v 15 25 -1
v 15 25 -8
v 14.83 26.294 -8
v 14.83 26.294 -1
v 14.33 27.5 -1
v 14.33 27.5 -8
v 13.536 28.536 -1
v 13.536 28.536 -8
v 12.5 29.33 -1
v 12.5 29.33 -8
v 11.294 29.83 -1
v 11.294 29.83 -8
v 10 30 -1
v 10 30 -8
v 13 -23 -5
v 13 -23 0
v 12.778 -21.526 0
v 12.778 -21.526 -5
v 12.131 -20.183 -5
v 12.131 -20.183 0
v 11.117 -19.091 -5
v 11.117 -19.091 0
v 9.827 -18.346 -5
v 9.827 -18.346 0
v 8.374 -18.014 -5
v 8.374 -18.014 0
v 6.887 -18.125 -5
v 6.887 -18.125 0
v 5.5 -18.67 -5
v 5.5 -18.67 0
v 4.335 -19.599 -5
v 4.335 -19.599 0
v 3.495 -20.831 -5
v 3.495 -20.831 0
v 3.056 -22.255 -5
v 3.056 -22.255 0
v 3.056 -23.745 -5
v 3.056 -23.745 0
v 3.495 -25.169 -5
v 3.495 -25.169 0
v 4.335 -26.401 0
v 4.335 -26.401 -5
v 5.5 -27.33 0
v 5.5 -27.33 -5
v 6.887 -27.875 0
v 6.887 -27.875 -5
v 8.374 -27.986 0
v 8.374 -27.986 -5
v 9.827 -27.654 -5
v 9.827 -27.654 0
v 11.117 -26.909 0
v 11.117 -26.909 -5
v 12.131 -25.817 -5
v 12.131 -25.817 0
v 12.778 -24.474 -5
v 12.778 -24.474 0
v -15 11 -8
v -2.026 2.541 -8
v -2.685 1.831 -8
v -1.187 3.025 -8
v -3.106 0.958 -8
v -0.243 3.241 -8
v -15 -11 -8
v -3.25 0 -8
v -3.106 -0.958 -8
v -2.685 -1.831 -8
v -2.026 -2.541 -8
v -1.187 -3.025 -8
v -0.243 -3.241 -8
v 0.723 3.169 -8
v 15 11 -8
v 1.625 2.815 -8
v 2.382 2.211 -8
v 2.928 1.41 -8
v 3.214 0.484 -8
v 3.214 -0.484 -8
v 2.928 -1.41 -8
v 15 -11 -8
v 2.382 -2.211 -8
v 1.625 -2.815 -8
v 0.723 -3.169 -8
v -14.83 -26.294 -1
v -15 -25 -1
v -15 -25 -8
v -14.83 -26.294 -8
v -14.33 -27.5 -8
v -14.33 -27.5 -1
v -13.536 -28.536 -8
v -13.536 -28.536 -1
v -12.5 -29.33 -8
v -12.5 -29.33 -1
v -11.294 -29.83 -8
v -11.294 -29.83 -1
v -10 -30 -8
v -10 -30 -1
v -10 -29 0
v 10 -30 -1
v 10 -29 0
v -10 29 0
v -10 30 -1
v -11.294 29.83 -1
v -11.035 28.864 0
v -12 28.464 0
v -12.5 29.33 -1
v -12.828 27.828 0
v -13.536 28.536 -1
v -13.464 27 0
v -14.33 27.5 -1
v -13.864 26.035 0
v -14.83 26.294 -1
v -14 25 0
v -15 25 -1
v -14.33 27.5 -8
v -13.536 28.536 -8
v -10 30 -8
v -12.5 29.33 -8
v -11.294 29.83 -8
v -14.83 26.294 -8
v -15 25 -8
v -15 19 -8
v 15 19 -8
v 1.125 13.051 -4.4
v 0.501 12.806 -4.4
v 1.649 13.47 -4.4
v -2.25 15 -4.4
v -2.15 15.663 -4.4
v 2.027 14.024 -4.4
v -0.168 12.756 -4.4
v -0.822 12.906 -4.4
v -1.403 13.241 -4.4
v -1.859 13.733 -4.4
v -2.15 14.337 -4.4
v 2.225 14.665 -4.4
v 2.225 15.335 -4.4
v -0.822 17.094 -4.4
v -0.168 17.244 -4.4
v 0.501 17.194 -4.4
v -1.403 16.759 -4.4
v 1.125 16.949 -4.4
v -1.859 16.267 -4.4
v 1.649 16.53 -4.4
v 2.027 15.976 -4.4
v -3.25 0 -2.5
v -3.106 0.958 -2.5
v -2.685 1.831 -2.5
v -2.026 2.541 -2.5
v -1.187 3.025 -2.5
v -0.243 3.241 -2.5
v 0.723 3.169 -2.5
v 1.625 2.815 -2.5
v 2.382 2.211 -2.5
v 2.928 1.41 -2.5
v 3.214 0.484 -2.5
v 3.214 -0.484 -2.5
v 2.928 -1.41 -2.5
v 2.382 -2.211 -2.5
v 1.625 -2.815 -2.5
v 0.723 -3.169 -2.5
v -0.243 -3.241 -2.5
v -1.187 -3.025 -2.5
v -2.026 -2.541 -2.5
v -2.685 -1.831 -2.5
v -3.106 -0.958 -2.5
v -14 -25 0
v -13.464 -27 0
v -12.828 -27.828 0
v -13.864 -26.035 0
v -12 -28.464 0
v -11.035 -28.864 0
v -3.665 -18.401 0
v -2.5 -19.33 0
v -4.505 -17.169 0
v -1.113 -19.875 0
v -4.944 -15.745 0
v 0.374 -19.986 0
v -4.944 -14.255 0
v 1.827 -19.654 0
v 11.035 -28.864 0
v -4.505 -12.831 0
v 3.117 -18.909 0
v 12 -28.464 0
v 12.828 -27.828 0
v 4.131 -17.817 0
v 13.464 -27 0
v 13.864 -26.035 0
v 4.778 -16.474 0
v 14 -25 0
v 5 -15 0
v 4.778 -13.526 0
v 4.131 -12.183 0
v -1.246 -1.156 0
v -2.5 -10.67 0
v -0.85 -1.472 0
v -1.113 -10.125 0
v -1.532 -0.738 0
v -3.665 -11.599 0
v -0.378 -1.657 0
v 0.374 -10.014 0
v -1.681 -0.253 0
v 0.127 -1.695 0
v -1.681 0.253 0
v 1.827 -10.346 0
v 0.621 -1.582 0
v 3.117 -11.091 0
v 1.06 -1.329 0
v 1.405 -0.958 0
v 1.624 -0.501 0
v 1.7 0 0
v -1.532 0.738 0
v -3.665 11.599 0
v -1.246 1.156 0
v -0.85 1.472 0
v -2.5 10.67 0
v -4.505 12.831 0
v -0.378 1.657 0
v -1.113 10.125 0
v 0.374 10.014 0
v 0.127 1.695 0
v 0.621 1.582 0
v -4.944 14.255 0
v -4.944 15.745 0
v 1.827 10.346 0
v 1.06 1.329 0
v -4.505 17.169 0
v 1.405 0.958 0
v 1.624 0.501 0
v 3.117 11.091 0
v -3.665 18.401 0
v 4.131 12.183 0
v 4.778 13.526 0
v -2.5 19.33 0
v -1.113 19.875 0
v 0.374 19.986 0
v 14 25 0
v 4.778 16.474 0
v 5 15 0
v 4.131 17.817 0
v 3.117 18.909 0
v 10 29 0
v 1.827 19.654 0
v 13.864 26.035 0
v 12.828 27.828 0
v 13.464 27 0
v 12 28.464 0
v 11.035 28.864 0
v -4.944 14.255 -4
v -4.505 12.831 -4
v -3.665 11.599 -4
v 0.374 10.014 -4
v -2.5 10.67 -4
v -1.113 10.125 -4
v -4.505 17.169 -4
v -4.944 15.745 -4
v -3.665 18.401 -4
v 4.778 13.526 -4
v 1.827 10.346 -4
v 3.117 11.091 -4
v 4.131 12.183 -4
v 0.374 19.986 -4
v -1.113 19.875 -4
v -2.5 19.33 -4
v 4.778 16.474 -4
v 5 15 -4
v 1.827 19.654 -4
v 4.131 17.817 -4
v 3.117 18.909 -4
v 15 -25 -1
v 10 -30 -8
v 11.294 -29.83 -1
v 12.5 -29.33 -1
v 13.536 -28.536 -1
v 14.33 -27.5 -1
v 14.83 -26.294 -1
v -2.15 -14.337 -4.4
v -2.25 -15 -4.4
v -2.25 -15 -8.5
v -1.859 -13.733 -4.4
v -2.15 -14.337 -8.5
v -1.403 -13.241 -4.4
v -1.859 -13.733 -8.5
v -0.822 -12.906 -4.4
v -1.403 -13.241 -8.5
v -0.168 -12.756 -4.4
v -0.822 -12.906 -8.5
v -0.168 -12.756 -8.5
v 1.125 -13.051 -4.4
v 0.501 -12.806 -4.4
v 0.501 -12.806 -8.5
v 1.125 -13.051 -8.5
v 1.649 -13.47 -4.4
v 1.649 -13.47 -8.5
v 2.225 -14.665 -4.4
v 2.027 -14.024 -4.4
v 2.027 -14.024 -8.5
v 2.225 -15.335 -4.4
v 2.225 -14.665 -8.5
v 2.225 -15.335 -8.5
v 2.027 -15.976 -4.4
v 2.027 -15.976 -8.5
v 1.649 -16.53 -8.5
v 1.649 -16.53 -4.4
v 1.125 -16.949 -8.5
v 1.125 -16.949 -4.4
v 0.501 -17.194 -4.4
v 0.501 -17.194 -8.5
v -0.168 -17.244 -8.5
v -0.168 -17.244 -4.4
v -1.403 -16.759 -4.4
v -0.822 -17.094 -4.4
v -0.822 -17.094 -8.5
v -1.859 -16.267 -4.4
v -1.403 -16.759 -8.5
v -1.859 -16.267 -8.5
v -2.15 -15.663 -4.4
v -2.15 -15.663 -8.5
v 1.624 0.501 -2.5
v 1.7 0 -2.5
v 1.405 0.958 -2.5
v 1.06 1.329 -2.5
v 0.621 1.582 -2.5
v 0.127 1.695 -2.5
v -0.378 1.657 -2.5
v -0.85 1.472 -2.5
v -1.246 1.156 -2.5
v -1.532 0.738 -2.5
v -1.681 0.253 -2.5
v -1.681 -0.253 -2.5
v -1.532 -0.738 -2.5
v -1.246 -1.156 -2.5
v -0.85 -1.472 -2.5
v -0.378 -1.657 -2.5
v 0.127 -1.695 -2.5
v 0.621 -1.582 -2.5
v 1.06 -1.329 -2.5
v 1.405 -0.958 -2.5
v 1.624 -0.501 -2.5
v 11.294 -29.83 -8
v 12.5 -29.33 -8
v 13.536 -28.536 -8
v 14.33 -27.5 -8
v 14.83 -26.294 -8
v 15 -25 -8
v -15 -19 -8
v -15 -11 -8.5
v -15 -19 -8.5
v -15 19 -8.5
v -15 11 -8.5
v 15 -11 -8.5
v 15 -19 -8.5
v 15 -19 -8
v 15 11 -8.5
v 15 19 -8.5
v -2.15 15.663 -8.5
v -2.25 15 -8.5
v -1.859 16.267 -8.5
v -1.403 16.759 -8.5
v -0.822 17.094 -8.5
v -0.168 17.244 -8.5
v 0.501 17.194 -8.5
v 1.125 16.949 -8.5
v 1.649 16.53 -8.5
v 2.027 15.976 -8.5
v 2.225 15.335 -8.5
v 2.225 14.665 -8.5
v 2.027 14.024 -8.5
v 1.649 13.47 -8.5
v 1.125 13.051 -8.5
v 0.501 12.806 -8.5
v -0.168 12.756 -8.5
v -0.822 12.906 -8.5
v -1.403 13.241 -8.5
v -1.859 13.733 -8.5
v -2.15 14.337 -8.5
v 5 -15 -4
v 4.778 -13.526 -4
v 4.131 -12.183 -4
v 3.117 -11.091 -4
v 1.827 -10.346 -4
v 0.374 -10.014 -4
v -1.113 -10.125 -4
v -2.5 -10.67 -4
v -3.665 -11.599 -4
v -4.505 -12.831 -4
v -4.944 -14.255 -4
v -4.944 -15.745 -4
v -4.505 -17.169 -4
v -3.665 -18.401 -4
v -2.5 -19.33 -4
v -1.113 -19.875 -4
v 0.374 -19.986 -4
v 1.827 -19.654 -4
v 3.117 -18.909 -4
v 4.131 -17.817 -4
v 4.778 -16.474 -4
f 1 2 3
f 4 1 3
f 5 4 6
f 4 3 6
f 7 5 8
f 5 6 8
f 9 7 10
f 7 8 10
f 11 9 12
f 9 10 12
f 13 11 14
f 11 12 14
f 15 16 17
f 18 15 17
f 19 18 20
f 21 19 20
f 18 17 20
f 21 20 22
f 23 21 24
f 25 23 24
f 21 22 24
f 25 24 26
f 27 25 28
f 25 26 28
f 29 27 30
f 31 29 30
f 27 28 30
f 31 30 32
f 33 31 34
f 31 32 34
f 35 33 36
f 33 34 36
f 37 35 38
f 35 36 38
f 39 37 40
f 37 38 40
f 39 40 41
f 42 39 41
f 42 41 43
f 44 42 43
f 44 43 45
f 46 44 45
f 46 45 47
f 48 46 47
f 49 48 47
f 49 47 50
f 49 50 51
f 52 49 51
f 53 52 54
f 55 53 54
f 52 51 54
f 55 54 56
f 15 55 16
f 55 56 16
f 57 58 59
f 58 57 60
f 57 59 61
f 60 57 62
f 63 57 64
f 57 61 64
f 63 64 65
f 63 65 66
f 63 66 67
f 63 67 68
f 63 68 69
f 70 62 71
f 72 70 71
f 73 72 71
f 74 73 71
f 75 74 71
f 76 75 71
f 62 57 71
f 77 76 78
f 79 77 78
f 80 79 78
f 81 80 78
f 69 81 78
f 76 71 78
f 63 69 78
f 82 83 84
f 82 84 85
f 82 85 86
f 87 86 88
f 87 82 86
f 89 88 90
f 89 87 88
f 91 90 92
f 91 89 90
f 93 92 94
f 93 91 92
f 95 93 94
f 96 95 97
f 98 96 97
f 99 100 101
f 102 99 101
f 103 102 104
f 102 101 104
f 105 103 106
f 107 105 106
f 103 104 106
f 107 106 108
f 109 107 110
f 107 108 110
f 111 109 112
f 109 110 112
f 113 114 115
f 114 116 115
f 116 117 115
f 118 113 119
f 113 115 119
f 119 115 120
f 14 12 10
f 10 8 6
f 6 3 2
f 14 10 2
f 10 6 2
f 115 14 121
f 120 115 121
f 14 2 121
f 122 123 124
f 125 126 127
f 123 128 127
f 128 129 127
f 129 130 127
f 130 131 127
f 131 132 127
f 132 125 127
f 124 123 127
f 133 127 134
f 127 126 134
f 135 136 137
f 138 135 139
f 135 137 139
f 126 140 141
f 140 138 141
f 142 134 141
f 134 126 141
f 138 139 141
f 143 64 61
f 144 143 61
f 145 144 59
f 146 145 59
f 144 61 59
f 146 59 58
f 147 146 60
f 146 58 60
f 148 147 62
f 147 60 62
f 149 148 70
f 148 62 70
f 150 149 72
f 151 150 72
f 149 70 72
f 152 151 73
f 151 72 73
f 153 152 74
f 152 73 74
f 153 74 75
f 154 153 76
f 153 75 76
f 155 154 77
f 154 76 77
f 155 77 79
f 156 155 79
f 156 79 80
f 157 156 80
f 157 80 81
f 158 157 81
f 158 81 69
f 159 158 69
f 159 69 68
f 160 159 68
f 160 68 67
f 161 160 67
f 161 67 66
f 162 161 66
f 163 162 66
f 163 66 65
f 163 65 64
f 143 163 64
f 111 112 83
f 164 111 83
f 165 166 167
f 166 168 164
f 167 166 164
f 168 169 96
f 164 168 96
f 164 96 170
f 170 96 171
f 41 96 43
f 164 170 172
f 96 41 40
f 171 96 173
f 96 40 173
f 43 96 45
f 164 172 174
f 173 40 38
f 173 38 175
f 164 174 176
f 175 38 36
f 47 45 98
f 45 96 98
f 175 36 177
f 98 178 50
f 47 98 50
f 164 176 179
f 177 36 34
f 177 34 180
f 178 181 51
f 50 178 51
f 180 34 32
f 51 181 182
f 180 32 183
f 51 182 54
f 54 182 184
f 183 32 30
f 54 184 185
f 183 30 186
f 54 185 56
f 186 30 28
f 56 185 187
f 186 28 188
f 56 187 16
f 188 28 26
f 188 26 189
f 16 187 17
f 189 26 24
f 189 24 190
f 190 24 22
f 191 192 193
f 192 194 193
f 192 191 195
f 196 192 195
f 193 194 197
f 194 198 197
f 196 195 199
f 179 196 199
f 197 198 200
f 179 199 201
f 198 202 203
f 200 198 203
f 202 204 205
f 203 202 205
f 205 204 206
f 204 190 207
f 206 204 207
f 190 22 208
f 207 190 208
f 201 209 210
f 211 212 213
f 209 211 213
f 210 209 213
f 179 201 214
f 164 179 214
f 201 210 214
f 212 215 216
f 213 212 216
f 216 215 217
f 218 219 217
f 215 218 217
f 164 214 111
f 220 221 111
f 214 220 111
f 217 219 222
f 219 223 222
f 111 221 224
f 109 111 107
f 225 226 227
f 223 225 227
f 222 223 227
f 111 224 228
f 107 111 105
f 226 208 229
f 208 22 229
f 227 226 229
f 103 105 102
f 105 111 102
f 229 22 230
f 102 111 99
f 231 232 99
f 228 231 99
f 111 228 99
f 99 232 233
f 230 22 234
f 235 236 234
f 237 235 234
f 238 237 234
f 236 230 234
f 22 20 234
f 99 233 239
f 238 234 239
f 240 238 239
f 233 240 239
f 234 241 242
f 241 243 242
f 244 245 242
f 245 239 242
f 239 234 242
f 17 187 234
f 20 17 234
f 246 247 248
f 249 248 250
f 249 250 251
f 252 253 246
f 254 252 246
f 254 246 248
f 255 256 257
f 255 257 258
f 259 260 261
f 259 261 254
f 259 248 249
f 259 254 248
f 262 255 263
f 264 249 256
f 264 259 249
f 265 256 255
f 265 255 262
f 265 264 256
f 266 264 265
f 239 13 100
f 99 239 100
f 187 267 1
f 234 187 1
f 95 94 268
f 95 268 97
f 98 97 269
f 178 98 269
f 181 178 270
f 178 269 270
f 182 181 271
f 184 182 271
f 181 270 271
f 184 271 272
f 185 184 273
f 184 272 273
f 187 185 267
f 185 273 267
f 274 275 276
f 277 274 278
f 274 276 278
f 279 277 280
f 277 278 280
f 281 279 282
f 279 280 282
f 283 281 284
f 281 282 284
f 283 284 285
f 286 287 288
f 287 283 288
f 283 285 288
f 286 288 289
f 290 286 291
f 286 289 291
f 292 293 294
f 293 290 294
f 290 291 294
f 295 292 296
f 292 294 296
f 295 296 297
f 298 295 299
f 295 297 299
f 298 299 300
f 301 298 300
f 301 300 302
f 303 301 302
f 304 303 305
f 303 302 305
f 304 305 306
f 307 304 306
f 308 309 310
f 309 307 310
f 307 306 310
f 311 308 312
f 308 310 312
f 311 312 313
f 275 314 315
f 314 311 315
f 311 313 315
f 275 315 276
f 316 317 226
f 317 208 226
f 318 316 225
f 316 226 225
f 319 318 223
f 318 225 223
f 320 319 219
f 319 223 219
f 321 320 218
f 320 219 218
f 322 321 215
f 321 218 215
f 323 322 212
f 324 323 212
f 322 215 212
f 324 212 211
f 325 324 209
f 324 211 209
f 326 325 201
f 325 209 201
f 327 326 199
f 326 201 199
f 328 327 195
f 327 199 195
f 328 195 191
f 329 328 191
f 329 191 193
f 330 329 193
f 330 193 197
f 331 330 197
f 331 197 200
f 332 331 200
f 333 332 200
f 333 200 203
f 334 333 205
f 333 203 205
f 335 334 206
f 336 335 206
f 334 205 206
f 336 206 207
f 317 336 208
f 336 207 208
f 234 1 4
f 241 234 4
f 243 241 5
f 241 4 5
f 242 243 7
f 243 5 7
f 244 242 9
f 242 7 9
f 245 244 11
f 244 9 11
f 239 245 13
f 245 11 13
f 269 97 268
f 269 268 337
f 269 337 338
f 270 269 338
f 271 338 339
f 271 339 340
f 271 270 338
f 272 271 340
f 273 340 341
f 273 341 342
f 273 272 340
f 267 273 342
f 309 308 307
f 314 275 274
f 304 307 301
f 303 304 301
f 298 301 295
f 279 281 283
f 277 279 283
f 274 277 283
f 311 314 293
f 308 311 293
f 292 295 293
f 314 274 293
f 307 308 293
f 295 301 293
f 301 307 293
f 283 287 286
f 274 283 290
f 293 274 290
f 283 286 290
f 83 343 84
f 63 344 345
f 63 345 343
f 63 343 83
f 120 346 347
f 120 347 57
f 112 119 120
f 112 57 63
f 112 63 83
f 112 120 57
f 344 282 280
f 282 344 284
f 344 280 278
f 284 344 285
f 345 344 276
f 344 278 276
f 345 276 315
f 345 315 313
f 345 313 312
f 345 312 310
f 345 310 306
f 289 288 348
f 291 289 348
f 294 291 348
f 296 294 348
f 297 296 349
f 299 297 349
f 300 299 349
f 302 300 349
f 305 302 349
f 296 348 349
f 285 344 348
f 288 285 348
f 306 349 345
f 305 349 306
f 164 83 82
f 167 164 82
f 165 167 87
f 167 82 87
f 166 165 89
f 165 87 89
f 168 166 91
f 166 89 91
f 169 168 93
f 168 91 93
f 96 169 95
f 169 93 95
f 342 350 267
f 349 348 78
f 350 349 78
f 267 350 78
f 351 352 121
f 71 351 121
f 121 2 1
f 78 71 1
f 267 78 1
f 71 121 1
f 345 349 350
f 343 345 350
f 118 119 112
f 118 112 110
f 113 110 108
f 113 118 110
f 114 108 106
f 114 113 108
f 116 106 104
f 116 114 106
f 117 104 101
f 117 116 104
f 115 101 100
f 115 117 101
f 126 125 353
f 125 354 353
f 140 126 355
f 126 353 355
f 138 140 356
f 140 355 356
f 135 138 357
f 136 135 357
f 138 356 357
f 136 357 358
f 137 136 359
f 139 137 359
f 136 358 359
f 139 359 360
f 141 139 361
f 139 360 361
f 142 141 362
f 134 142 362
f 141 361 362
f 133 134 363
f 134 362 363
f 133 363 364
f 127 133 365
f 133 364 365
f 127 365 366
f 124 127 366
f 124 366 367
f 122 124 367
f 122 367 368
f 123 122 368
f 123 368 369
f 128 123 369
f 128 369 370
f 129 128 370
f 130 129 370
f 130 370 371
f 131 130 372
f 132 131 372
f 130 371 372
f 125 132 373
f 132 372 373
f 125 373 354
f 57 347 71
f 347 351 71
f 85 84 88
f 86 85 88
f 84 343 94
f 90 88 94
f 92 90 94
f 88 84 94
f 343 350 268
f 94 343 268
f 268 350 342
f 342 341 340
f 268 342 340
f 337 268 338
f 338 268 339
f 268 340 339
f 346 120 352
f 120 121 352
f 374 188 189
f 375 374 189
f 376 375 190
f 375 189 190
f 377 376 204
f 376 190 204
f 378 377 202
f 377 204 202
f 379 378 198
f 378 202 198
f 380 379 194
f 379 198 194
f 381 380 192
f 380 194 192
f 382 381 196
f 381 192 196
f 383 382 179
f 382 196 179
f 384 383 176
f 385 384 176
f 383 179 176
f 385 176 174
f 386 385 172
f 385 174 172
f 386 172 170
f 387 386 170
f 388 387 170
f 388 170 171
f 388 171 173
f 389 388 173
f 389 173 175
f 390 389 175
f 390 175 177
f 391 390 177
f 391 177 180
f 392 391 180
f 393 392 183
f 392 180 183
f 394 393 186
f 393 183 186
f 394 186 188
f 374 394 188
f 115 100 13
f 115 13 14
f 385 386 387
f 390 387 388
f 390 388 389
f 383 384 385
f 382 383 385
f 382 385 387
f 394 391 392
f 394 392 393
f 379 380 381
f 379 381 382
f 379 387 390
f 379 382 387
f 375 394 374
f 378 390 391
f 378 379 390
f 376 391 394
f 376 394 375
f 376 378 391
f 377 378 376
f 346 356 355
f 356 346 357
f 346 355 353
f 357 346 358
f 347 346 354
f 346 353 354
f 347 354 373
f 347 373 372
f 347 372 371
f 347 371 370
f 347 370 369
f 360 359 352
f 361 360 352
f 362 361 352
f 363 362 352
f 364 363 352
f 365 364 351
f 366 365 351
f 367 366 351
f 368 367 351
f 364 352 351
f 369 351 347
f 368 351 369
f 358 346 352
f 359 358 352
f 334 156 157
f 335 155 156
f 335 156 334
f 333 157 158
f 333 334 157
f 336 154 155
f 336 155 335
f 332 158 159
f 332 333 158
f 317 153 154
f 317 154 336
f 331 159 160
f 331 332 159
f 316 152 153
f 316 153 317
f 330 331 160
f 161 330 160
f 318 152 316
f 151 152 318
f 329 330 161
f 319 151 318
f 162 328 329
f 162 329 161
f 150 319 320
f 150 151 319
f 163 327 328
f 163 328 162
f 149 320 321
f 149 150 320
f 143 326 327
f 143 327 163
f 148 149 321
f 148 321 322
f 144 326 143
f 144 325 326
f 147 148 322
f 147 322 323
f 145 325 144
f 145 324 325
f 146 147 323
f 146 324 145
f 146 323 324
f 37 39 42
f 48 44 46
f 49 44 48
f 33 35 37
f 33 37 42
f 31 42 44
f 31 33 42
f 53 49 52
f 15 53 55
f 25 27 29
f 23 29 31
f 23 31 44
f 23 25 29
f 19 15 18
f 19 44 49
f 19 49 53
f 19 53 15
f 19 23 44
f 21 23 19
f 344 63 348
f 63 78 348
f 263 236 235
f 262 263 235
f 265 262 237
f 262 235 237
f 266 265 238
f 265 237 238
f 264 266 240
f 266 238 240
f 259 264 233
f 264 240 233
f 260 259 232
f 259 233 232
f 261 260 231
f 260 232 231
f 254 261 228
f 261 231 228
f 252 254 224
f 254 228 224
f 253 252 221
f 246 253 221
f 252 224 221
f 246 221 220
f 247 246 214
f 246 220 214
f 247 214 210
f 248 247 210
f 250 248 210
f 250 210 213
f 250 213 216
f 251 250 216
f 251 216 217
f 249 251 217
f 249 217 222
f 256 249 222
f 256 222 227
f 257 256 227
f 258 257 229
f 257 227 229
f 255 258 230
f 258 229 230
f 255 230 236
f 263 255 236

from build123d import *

# Parameters (mm, degrees)
BOSS_EXTRUDE1_DEPTH                                 = 15
M4_CLEARANCE_HOLE1_D                                = 4.5
M4_CLEARANCE_HOLE1_DEPTH                            = 16
M4_CLEARANCE_HOLE1_TIP                              = 1.351936393
CBORE_FOR_M3_HEX_SOCKET_HEAD_CAP_SCREW1_D           = 3.4
CBORE_FOR_M3_HEX_SOCKET_HEAD_CAP_SCREW1_CBORE_D     = 6.5
CBORE_FOR_M3_HEX_SOCKET_HEAD_CAP_SCREW1_CBORE_DEPTH = 6
FILLET1_R                                           = 5
CHAMFER1_SIZE                                       = 1
SKETCH6_R                                           = 5
CUT_EXTRUDE1_DEPTH                                  = 5
SKETCH7_R                                           = 5
CUT_EXTRUDE2_DEPTH                                  = 4
BOSS_EXTRUDE2_START                                 = -0.4
SKETCH8_R                                           = 2.25
BOSS_EXTRUDE2_DEPTH                                 = 0.4


with BuildPart() as part:
    # Sketch1 → Boss-Extrude1 (new, symmetric)
    with BuildSketch(Plane(origin=(0, 0, 0), x_dir=(0, 0, -1), z_dir=(1, 0, 0))):
        Polygon((8, -19), (8, -30), (0, -30), (0, 30), (8, 30), (8, 19), (8.5, 19), (8.5, 11), (8, 11), (8, -11), (8.5, -11), (8.5, -19), align=None)
    extrude(amount=BOSS_EXTRUDE1_DEPTH, both=True)

    # M4 Clearance Hole1
    with Locations(Plane.XY):
        with Locations((0, -15), (0, 15)):
            Hole(M4_CLEARANCE_HOLE1_D / 2, depth=M4_CLEARANCE_HOLE1_DEPTH)
            with Locations((0, 0, -(M4_CLEARANCE_HOLE1_DEPTH + M4_CLEARANCE_HOLE1_TIP / 2))):  # 118° drill point
                Cone(0, M4_CLEARANCE_HOLE1_D / 2, M4_CLEARANCE_HOLE1_TIP, mode=Mode.SUBTRACT)

    # CBORE for M3 Hex Socket Head Cap Screw1 (through all)
    with Locations(Plane(origin=(0, 0, -8.5), x_dir=(-1, 0, 0), z_dir=(0, 0, -1))):
        with Locations((0, 0)):
            CounterBoreHole(CBORE_FOR_M3_HEX_SOCKET_HEAD_CAP_SCREW1_D / 2, CBORE_FOR_M3_HEX_SOCKET_HEAD_CAP_SCREW1_CBORE_D / 2, CBORE_FOR_M3_HEX_SOCKET_HEAD_CAP_SCREW1_CBORE_DEPTH)

    # Fillet1
    fillet1_edges = [part.edges().sort_by_distance(p)[0] for p in [
        (-15, -30, -4),
        (-15, 30, -4),
        (15, 30, -4),
        (15, -30, -4),
    ]]
    fillet(fillet1_edges, radius=FILLET1_R)

    # Chamfer1
    chamfer1_edges = [part.edges().sort_by_distance(p)[0] for p in [
        (0, 30, 0),
        (-15, 0, 0),
        (0, -30, 0),
        (15, 0, 0),
        (-13.535533906, -28.535533906, 0),
        (13.535533906, -28.535533906, 0),
        (13.535533906, 28.535533906, 0),
        (-13.535533906, 28.535533906, 0),
    ]]
    chamfer(chamfer1_edges, length=CHAMFER1_SIZE)

    # Sketch6 → Cut-Extrude1 (cut)
    with BuildSketch(Plane.XY):
        with Locations((8, -23)):
            Circle(SKETCH6_R)
    extrude(amount=-CUT_EXTRUDE1_DEPTH, mode=Mode.SUBTRACT)

    # Sketch7 → Cut-Extrude2 (cut)
    with BuildSketch(Plane.XY):
        with Locations((0, 15)):
            Circle(SKETCH7_R)
        with Locations((0, -15)):
            Circle(SKETCH7_R)
    extrude(amount=-CUT_EXTRUDE2_DEPTH, mode=Mode.SUBTRACT)

    # Sketch8 → Boss-Extrude2 (add)
    with BuildSketch(Plane.XY.offset(-4).offset(BOSS_EXTRUDE2_START)):
        with Locations((0, 15)):
            Circle(SKETCH8_R)
        with Locations((0, -15)):
            Circle(SKETCH8_R)
    extrude(amount=BOSS_EXTRUDE2_DEPTH)


solid = part.part
